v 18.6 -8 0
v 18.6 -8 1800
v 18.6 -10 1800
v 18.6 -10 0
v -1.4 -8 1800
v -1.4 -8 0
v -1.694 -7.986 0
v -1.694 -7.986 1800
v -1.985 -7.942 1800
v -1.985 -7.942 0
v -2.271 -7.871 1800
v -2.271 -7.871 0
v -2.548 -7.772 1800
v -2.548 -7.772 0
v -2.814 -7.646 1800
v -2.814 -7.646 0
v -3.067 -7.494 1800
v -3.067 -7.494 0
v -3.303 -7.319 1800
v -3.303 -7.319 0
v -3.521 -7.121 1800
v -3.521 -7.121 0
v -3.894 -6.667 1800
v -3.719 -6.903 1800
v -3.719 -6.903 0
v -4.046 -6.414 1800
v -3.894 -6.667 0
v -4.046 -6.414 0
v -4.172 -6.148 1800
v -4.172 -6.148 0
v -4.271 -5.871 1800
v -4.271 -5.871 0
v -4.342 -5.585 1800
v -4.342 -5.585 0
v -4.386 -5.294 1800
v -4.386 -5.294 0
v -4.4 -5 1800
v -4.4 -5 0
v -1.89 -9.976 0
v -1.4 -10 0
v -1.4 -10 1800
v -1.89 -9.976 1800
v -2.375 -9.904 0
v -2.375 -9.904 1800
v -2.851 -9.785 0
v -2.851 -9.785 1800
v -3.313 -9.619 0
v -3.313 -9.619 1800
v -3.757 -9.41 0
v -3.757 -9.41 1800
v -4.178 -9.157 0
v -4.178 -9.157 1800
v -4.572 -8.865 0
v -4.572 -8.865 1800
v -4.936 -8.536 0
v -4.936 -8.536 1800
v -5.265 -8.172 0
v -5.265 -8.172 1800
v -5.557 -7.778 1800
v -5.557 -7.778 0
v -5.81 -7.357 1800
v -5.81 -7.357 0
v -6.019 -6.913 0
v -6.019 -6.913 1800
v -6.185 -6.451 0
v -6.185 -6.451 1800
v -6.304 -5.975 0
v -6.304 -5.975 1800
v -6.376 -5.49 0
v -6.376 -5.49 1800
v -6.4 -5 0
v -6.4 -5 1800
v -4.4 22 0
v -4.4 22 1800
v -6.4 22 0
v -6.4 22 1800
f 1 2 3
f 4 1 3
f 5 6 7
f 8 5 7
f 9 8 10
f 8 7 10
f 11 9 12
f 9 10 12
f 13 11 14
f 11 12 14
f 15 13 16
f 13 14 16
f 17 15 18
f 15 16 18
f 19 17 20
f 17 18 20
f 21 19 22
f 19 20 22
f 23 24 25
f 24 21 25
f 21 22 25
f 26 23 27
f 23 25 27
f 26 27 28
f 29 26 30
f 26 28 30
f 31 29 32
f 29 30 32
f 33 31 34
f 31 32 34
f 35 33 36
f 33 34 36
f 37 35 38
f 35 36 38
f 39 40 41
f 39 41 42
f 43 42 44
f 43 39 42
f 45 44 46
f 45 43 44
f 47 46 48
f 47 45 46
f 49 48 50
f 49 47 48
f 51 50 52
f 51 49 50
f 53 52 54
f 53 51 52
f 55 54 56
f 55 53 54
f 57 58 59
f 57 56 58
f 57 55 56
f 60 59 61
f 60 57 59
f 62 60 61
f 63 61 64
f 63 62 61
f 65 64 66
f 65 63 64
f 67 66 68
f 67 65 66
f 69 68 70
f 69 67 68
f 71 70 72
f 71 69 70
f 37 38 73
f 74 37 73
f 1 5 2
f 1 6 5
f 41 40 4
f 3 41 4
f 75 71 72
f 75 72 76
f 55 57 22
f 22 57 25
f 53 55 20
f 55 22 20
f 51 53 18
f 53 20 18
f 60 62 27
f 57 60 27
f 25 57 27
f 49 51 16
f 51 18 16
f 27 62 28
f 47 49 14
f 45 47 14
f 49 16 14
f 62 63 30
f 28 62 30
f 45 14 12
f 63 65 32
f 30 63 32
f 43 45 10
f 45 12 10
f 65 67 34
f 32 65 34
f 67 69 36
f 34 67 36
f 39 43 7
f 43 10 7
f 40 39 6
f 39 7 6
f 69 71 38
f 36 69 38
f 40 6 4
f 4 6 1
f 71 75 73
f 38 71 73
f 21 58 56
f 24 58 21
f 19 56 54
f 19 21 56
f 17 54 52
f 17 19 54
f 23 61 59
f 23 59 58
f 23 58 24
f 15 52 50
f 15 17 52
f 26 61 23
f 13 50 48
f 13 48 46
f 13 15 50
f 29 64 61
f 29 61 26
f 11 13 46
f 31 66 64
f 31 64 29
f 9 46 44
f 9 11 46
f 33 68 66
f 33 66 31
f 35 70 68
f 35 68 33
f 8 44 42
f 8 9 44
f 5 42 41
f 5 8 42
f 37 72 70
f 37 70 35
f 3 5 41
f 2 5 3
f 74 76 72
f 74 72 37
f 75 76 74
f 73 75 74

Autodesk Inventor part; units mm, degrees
ref_plane "YZ Plane" through (0, 0, 0) normal (1, 0, 0) x (0, 1, 0)
ref_plane "Начальная плоскость" through (0, 0, 0) normal (0, 0, 1) x (1, 0, 0)
ref_plane "Конечная плоскость" through (0, 0, 1800) normal (0, 0, 1) x (1, 0, 0)
sketch "Sketch2" plane through (0, 0, 0) normal (0, 0, 1) x (1, 0, 0)
  line L0 (-4.4, -5) -> (-4.4, 22)
  line L1 (-6.4, 22) -> (-4.4, 22)
  line L2 (-6.4, -5) -> (-6.4, 22)
  line L3 (-1.4, -10) -> (18.6, -10)
  line L4 (18.6, -8) -> (18.6, -10)
  line L5 (-1.4, -8) -> (18.6, -8)
  arc A0 (-4.4, -5) -> (-1.4, -8) centre (-1.4, -5) ccw
  arc A1 (-6.4, -5) -> (-1.4, -10) centre (-1.4, -5) ccw
  line L6 (0, 30.2071) -> (0, -6.2426) construction
  line L7 (-5.2426, 0) -> (24.2071, 0) construction
  point P0 (-4.4, -8)
  point P1 (-6.4, -10)
  dimension "d4" = 25
  dimension "d6" = 32
  dimension "d8" = 2
  dimension "d10" = 2
  dimension "d17" = 3
  dimension "d18" = 5
  dimension "d21" = 6.4
  dimension "d22" = 10
extrude "Базовый элемент" add sketch "Sketch2" along normal up to surface (1800 mm away) from surface at 0
sketch "Sketch3" plane through (0, 0, 0) normal (0, 0, 1) x (1, 0, 0)
  line L0 (0, 0) -> (10, 0)
ref_plane "Work Plane10" through (0, 0, 0) normal (0, -1, 0) x (1, 0, 0)
sketch "Sketch4" plane through (0, 0, 0) normal (0, -1, 0) x (1, 0, 0)
  line L0 (-2, 0) -> (12, 0)
  line L1 (-2, 1800) -> (12, 1800)
  dimension "d24" = 1800
equation "\"d4\" = a"
equation "\"d6\" = b"
equation "\"d8\" = ParT"
equation "\"d10\" = ParT"
equation "\"d17\" = R"
equation "\"d18\" = R + ParT"
equation "\"d21\" = ex"
equation "\"d22\" = ey"
equation "\"d11\" = G_L"
equation "\"b\" = 32"
equation "\"ParT\" = 2"
equation "\"R\" = 3"
equation "\"G_L\" = d24"
equation "\"a\" = 25"
equation "\"G_OFFSET_START\" = 0"
equation "\"G_OFFSET_END\" = 0"
equation "\"ex\" = 6.4"
equation "\"ey\" = 10"
properties part number "Угол 32x25x2-1800 ГОСТ 19772-93" material "Сталь, мягкая"
